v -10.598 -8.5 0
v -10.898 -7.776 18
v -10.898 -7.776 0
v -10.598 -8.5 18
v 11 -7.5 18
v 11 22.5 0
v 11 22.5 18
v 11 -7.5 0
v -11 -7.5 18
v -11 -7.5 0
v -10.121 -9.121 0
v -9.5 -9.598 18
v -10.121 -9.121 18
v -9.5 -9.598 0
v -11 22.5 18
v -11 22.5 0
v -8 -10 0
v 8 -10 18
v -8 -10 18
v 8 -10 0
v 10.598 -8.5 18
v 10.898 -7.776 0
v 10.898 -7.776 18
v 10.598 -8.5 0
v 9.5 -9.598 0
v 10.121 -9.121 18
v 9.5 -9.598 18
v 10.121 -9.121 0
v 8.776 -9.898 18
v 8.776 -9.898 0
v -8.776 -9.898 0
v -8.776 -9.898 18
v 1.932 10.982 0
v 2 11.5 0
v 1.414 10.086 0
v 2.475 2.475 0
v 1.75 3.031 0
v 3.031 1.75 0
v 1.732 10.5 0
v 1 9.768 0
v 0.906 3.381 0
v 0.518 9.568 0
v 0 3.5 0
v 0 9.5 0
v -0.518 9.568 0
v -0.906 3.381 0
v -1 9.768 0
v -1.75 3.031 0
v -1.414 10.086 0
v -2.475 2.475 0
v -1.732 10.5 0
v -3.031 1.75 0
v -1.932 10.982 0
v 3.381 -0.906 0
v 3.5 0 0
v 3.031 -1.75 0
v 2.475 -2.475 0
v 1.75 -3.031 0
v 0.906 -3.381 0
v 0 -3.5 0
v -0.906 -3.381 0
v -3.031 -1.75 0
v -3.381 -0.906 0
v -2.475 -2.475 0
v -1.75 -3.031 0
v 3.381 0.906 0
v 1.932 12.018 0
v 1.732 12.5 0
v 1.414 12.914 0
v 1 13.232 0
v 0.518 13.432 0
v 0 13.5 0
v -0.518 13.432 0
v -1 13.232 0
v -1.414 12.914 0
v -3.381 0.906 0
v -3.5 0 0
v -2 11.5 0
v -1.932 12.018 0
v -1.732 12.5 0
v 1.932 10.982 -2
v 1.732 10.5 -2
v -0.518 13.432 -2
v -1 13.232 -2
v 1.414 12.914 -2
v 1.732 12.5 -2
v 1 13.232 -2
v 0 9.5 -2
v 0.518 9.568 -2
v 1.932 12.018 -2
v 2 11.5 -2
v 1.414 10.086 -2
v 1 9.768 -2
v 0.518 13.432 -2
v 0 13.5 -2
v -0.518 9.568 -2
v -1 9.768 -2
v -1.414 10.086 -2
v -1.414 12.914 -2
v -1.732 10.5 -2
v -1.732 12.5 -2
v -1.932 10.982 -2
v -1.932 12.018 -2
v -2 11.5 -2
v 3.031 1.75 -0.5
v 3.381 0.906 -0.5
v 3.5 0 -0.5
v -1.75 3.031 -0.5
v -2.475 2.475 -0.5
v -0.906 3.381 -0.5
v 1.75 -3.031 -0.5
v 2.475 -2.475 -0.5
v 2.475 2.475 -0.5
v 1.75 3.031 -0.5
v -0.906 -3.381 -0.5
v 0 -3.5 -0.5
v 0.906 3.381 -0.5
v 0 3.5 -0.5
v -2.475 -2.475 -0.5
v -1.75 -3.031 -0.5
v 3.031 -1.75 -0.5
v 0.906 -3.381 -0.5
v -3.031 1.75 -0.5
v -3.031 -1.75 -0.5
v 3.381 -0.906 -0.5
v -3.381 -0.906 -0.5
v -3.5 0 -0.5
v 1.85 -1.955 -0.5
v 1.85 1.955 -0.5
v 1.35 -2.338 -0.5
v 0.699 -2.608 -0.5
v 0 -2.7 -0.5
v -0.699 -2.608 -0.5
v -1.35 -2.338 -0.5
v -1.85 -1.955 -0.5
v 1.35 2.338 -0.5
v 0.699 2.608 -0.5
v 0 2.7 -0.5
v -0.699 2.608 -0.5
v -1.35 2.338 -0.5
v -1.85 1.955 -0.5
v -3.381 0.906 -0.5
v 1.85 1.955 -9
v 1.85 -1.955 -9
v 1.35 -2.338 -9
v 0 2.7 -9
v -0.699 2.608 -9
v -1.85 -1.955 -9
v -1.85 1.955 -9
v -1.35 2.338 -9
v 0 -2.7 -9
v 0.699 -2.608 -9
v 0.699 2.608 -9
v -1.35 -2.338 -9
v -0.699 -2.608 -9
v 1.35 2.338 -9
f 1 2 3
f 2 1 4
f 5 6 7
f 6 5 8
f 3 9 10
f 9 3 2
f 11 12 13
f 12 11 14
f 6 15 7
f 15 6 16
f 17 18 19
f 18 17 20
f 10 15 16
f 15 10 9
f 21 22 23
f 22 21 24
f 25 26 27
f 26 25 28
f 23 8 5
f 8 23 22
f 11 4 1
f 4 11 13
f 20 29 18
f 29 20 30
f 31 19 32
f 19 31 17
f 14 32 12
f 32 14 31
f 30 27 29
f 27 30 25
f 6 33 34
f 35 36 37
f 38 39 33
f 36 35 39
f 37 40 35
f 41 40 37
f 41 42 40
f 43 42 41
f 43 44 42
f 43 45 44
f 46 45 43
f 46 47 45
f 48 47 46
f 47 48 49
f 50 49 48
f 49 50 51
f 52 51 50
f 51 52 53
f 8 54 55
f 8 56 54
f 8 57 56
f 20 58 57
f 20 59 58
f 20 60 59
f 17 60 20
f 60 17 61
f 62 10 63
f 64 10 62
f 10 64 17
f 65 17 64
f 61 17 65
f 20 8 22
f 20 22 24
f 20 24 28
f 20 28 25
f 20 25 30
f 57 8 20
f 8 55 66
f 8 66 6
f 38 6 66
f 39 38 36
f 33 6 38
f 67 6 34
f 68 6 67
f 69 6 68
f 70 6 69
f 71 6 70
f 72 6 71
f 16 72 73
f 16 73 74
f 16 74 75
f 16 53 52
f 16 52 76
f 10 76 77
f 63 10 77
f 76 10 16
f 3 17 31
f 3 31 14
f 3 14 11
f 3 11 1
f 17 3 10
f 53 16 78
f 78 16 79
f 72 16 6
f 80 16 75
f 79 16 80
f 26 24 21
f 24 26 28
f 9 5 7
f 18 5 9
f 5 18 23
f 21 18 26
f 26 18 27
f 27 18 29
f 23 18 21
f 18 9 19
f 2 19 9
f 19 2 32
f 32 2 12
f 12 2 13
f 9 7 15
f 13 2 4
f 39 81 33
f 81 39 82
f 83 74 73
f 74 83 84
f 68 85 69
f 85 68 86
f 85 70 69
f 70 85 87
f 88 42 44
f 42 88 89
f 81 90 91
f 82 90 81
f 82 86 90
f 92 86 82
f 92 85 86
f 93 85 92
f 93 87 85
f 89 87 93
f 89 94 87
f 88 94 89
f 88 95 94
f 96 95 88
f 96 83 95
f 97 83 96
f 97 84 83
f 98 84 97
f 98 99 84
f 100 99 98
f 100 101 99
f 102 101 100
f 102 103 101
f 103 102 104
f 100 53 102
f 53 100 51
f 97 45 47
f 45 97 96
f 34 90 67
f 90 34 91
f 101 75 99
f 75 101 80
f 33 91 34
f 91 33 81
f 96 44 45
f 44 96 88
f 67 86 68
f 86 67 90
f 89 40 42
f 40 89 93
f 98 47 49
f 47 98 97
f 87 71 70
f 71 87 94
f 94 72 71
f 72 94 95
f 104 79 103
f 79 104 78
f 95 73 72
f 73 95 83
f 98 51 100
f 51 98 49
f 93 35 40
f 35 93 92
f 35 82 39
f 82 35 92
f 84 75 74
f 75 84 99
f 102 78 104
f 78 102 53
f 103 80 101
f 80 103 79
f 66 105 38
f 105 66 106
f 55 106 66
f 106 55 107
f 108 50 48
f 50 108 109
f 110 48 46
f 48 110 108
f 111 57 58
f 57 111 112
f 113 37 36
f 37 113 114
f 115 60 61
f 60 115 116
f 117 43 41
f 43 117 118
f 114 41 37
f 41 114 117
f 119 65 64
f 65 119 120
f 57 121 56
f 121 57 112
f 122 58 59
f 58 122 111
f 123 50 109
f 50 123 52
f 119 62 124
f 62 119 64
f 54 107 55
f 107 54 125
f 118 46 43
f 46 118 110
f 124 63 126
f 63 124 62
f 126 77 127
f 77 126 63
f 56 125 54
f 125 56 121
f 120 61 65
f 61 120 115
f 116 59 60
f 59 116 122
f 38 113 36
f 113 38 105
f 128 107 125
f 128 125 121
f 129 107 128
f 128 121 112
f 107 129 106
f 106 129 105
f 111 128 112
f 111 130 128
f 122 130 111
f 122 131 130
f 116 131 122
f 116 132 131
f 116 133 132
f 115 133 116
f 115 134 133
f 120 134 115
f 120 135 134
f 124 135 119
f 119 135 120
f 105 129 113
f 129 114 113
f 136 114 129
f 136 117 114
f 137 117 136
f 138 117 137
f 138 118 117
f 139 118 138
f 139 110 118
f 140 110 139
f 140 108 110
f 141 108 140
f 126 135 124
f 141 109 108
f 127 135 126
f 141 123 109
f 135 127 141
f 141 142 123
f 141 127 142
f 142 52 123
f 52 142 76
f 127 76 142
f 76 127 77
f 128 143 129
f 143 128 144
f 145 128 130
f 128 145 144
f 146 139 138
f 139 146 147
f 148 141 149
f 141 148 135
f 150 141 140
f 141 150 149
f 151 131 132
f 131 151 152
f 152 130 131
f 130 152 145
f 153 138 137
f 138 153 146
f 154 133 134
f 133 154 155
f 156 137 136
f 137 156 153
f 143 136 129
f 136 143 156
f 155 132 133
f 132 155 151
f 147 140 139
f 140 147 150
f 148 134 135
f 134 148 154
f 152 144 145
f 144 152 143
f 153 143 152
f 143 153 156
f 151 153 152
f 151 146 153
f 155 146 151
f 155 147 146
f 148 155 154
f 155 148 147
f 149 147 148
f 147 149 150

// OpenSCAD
$fn=24;

motor();

module motor_shaft() intersection(){ circle(d=5.4); square([3.7,6],true); }

module motor_stub() translate([0,11.5]) circle(r=2);

module motor_body()
{
    linear_extrude(18) hull()
    {
        translate([0,7.5]) square([22,30],true);
        for(i=[-1,1]) translate([8*i,-7]) circle(r=3);
    }
    mirror([0,0,1]) linear_extrude(2) motor_stub();
    translate([0,0,-0.5]) cylinder(d=7,h=0.5);
}

module motor(r=0)
{
    color("White") mirror([0,0,1]) linear_extrude(9) motor_shaft();
    color("Yellow") rotate(r) motor_body();
}
